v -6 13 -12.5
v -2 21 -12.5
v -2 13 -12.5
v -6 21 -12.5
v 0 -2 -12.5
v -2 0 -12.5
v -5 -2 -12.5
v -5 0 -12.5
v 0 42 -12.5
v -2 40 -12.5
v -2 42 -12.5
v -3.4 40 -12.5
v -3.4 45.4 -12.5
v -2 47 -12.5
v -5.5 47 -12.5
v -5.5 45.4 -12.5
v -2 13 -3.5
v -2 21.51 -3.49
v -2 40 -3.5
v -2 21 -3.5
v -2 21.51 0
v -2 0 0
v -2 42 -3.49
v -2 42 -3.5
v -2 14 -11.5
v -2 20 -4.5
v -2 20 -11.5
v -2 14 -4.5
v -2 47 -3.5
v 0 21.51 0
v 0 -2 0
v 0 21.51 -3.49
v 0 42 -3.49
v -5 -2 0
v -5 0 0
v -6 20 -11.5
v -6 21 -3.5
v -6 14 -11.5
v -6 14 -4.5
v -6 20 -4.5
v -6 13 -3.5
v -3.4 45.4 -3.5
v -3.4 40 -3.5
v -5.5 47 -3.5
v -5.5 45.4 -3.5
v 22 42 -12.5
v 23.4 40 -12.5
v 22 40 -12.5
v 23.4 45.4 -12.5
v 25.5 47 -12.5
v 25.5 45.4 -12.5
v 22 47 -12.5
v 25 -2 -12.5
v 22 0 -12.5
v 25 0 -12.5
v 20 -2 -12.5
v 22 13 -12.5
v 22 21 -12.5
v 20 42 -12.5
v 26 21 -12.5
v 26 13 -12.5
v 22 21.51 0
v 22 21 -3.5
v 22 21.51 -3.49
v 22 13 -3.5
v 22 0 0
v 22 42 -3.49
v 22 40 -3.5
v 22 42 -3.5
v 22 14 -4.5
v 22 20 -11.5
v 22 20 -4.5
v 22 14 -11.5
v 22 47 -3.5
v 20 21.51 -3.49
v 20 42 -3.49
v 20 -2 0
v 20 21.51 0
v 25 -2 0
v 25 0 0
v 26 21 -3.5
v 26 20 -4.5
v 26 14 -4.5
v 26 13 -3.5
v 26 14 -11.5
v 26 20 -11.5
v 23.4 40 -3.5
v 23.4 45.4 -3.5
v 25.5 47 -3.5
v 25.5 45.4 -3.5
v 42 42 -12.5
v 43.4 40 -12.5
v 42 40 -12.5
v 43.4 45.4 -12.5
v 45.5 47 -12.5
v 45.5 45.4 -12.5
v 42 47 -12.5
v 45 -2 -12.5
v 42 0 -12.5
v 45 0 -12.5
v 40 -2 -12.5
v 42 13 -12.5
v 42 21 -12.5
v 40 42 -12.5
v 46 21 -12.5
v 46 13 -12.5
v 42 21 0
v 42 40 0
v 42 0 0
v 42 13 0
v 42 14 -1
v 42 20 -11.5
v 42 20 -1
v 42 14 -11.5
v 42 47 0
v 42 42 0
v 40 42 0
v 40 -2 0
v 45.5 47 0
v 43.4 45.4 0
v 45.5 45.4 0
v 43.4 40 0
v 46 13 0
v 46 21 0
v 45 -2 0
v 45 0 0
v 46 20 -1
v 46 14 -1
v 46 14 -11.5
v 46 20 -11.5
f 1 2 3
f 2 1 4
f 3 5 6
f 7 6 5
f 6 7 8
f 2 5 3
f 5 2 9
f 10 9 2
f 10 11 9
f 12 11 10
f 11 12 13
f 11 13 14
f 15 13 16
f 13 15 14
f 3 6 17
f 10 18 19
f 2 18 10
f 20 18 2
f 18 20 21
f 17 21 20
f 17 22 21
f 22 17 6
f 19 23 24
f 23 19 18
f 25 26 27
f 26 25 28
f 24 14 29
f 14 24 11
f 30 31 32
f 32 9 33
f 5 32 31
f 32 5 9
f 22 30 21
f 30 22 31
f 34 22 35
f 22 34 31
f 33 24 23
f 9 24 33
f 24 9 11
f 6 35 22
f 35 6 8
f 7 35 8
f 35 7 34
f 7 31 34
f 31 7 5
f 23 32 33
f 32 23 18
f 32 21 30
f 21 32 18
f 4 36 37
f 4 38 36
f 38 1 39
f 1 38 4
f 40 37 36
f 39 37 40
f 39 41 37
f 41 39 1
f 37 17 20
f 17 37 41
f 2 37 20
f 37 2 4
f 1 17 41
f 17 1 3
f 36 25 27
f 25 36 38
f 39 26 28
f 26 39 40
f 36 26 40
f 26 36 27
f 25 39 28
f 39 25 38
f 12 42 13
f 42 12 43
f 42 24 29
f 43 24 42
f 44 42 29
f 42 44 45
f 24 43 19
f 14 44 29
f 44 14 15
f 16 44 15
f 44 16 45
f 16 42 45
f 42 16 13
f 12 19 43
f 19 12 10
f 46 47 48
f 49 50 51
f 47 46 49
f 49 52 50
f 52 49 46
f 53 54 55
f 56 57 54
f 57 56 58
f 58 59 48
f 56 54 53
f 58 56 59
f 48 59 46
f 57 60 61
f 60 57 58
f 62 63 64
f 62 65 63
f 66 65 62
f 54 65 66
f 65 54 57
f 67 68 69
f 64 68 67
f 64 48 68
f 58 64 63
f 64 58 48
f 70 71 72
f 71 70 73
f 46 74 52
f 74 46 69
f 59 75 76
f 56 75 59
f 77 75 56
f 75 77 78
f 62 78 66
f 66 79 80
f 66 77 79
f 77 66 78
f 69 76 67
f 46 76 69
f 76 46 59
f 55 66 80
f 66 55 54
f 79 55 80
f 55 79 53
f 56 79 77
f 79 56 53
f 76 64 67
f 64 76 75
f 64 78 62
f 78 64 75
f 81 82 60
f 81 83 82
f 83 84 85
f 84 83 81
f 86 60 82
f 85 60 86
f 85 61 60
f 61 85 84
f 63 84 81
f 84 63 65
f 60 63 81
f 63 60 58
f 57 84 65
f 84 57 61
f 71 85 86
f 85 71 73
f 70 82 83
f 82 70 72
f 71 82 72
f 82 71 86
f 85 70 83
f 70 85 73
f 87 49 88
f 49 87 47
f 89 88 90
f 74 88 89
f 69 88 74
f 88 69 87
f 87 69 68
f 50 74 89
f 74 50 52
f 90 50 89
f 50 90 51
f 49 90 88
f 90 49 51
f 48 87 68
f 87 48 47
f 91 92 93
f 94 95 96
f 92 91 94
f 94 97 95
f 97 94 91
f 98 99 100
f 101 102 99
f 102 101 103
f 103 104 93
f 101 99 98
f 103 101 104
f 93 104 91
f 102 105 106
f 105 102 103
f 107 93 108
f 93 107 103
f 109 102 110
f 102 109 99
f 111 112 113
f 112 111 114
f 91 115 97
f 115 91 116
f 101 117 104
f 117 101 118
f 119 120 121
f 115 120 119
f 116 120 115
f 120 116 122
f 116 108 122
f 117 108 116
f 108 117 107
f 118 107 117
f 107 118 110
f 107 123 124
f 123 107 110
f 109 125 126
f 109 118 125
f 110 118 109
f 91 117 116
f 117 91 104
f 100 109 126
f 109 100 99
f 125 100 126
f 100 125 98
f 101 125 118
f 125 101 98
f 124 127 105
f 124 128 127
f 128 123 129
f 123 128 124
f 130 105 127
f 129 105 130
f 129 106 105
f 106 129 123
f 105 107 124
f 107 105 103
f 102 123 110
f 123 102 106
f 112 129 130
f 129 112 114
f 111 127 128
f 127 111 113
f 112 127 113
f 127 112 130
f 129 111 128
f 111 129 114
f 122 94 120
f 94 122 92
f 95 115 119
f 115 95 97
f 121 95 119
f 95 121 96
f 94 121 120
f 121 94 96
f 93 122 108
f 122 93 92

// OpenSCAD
// file: roundCornersCube.scad
/*
http://codeviewer.org/view/code:1b36 
Copyright (C) 2011 Sergio Vilches
This program is free software: you can redistribute it and/or modify it under the terms of the GNU General Public License as published by the Free Software Foundation, either version 3 of the License, or (at your option) any later version.
This program is distributed in the hope that it will be useful, but WITHOUT ANY WARRANTY; without even the implied warranty of MERCHANTABILITY or FITNESS FOR A PARTICULAR PURPOSE. See the GNU General Public License for more details. You should have received a copy of the GNU General Public License along with this program. If not, see <http://www.gnu.org/licenses/>.
Contact: s.vilches.e@gmail.com


    ----------------------------------------------------------- 
                 Round Corners Cube (Extruded)                
      roundCornersCube(x,y,z,r) Where:                        
         - x = Xdir width                                     
         - y = Ydir width                                     
         - z = Height of the cube                             
         - r = Rounding radious                               
                                                              
      Example: roundCornerCube(10,10,2,1);                    
     *Some times it's needed to use F6 to see good results!   
 	 ----------------------------------------------------------- 
*/
// Test it!
// roundCornersCube(10,5,2,1);


module createMeniscus(h,radius) // This module creates the shape that needs to be substracted from a cube to make its corners rounded.
difference(){        //This shape is basicly the difference between a quarter of cylinder and a cube
   translate([radius/2+0.1,radius/2+0.1,0]){
      cube([radius+0.2,radius+0.1,h+0.2],center=true);         // All that 0.x numbers are to avoid "ghost boundaries" when substracting
   }

   cylinder(h=h+0.2,r=radius,$fn = 25,center=true);
}


module roundCornersCube(x,y,z,r)  // Now we just substract the shape we have created in the four corners
difference(){
   cube([x,y,z], center=true);

translate([x/2-r,y/2-r]){  // We move to the first corner (x,y)
      rotate(0){  
         createMeniscus(z,r); // And substract the meniscus
      }
   }
   translate([-x/2+r,y/2-r]){ // To the second corner (-x,y)
      rotate(90){
         createMeniscus(z,r); // But this time we have to rotate the meniscus 90 deg
      }
   }
      translate([-x/2+r,-y/2+r]){ // ... 
      rotate(180){
         createMeniscus(z,r);
      }
   }
      translate([x/2-r,-y/2+r]){
      rotate(270){
         createMeniscus(z,r);
      }
   }
}

module createSubtractor(h,radius) //Create the shape that needs to be substracted from a cube
difference(){ cube([radius+0.1,radius+0.1,h]); cylinder(h=h,r=radius+0.1,$fn = 25); } //+0.1 stops ghost edges

module rCube(x,y,z,r)//Create a cube and subtract the 4 corners
difference(){
cube([x,y,z]);
translate([x-r,y-r]) rotate(0) createSubtractor(z,r); 
translate([r,y-r]) rotate(90) createSubtractor(z,r);
translate([r,r]) rotate(180) createSubtractor(z,r);
translate([x-r,r]) rotate(270) createSubtractor(z,r);
}
// main file
$fn = 20;

include <roundCornersCube.scad>



/////CASE SIZE/////
//case length (outer)
cl = 175;

//case width (outer)
cw = 95;

//case bottom thickness
cbth = 2;


//case bottom height
cbh = 10+cbth;

//case top thickness
ctth = 2;


//case top height
cth = 15+ctth;

//case roundness radius
crr = 2.5;

//case wall thickness
cwth = 3;

//case key holes width
ckhw = 43;

//case key holes length
ckhl = 110;

//case display hole length
cdhl = 37;

//case display hole width
cdhw = 32;

//case display hole radius
cdhr = 2;


/////KEY SIZES/////
//white key total length
wktl = 42;

//black key total length
bktl = 20;

//white key total width
wktw = 12.5;

//black key total width
bktw = 6;

//distance between keys
dbk = 8;

//white key thickness
wkth = 2;

//white key lip height
wklh = 5;

//key tolerance
key_tol = 1;

module button_holders()
{
holder(r=1.20,h=10-1.6);

translate([91.44,0,0])
holder(r=1.20,h=10-1.6);


translate([91.44,15.875,0])
holder(h=10-1.6);


translate([0,15.875,0])
holder(h=10-1.6);



//translate([44.45,0,0])
translate([46.99,0,0])
holder(r=1.2,h=10-1.6);


//translate([44.45,7.62,0])
translate([46.99,7.62,0])
holder(h=10-1.6);


}


module pcb_holders()
{
holder(h=4, r=0.95);

translate([78.74,-28.575,0])
holder(h=4, r=0.95);

translate([0,-28.575,0])
holder(h=4, r=.95);


translate([78.74,0,0])
holder(h=4, r=.95);


}

module corner_holders()
{
translate([6,6,-cbh+cbth])
holder(h=10);


//translate([6,85-1+5,-cbh+cbth])
//holder(h=10);


translate([170-1,5+1,-cbh+cbth])
holder(h=10);


translate([170-1,85-1+5,-cbh+cbth])
holder(h=10);


}


module 4_button()
{
cylinder(r=6, h=2);
translate([0,0,2])
cylinder(r=4.5, h=4);


}

module 4_buttons()
{
holder();
translate([0,36.195,0])
holder();

translate([26.67,36.195,0])
holder();

translate([26.67,0,0])
holder();
}

module 4_buttons_holes()
{
translate([13.335, 3.175,0])
cylinder(r=5,h=10);

translate([3.175, 13.97,0])
cylinder(r=5,h=10);


translate([13.335, 24.765,0])
cylinder(r=5,h=10);


translate([23.495, 13.97,0])
cylinder(r=5,h=10);
}


module corner_holders_top()
{
translate([6,6,-cbh+cbth])
holder(h=15,w=2);


//translate([6,85-1,-cbh+cbth])
//holder(h=10, w=3);


translate([170-1,5+1,-cbh+cbth])
holder(h=15, w=3);


translate([170-1,85-1+5,-cbh+cbth])
holder(h=15, w=3);


}

module holder(r=1.5, h=5, w=4)
{
difference()
{
cylinder(r=r+w, h=h);
cylinder(r=r, h=h);
}
}

module atmega()
{
color("yellow")
//cube([53, 16, 5]);
cube([85, 35, 1.6]);
}


module AAA_battery()
{
  cylinder(r=10.2/2, h=44.25);
  translate([0,0,44.25])
  cylinder(r=3.3/2, h=1);
}



module small_display()
{
//display outer
do = [58, 32, 1.6];
//display display
dd = [71.2, 25.2, 13.5];

cube(do);

}


module display()
{
//display outer
do = [80, 36, 1.6];
//display display
dd = [71.2, 25.2, 13.5];

cube(do);
translate([4.4,5.4,-3])
color("lightblue")
cube(dd);

module hole()
{
difference()
{
color("red")
cylinder(r=2.5, h=1.61);
cylinder(r=1, h=18);
}
}
//holes
translate([2.5, 2.5,0])
hole();

translate([2.5, do[1]-2.5,0])
hole();

translate([do[0]-2.5, do[1]-2.5,0])
hole();

translate([do[0]-2.5,2.5,0])
hole();
}


module white_key()
{


}


module case_bottom()
{
  

  difference()
  {
  union()
  {
  translate([0,60,0])
  lcd_housing_bottom();

  //holder in lcd housing
  translate([3+48/2,100.5,2])
  holder(h=10);


  //headphone jack holders
  translate([155,6,2])
  holder(r=1.4,h=3);

  translate([155-2.54*10,6,2])
  holder(r=1.4,h=3);

  difference()
  {
  rCube(cl, cw, cbh,crr);
  

  translate([cwth,cwth,ctth])
  cube([cl-cwth*2, cw-cwth*2, cbh]);

  //lcd housing hole
  translate([3,90,2])
  cube([48,6,12]);

  //headphone jack hole
  translate([155-2.54*5,5,10])
  rotate([90,0,0])
  cylinder(d=6, h=10);
  }

  translate([0,0,cbh])
  corner_holders();
  }

  //sunk holes
  translate([6,6,-.01])
  cylinder(r=3.5, h=5);

  translate([170-1,5+1,-.01])
  cylinder(r=3.5, h=5);

  translate([170-1,85-1+5,-.01])
  cylinder(r=3.5, h=5);
  
  //lcd housing sunk hole
  translate([3+48/2,100.5,-.01])
  cylinder(r=3.5, h=5);
  }
}

module key_holder()
{
  translate([0,-2,0])
  difference()
  {
  translate([0,0,-3])
  cube([106,8,8]);

  translate([0,0,3])
  cube([108,5,2]);

  translate([0,3,0])
  cube([108,2,4]);  
  }

  //support
  color("red")
  translate([0,-2,2])
  cube([106,.25,3]);


  color("red")
  translate([0,-.25+1,2])
  cube([106,.25,3]);


}

module holder_at_key(width=wktw)
{
  translate([wktw-width,0,0])
  {
  cube([width,5,1.4]);

  translate([0,3.4,0])
  cube([width,1.6,3.5]);

  }
  
}

module foil_holder(width=wktw)
{
  translate([wktw-width,0,0])
  difference()
  {
  cube([width,8,4]);
  translate([1,1,0])
  cube([width-2,6,6]);
  }
}


module white_key_1(notch=true)
{
  difference()
  {
  union()
  {
  cube([wktw,wktl,wkth]);
  translate([0,-wkth,0])
  cube([wktw,wkth,wklh]);
  }

  //notch for black key
  if(notch)
  translate([-.01,wktl-bktl-key_tol/2+.01,-.1])
  cube([bktw/2+key_tol/2,bktl+key_tol/2,5]);

  }
  
  color("red")
  translate([0,38-23-2,2])
  if(!notch)
    foil_holder();
  else
    foil_holder(width=wktw-bktw/2-key_tol/2);

  translate([0,wktl,2])
  color("brown")
  if(!notch)
    holder_at_key();
  else
    holder_at_key(width=wktw-bktw/2-key_tol/2);

  if(notch)
    translate([bktw/2+key_tol/2,wktl-2,2])
    cube([wktw-bktw/2-key_tol/2,2,1.4]);
  else
    translate([0,wktl-2,2])
    cube([wktw,2,1.4]);
}

rotate([0,-90,0])
white_key_2();

translate([20,0,0])
rotate([0,90,0])
white_key_1();


translate([40,0,0])
rotate([0,90,0])
white_key_3();


module white_key_2()
{
mirror([1,0,0])
white_key_1();

}

module white_key_3()
{
white_key_1(false);
}

module case_top()
{

  //LCD spacers
  translate([cwth*2+40-2,46+10,10])
  holder(h=5, w=2, r=.95);

  translate([cwth*2,46+10,10])
  holder(h=5, w=2, r=.95);

  translate([cwth*2,46+40+10,10])
  holder(h=5, w=2, r=.95);

  translate([cwth*2+40,46+40+10,10])
  holder(h=5, w=2, r=.95);


  //spacers for 4 buttons
  translate([90,55+2,10])
  rotate([0,0,90])
  4_buttons();


  //holders for keys
  translate([cwth*2+4,45,10])
  key_holder();


  difference()
  {
    rCube(cl, cw, cth, crr);
    translate([cwth*3,-.1,-1])
    {
      rCube(ckhl, ckhw, cth*2, 4);
      translate([0,-4,0])
      cube([ckhl, ckhw, cth*2]);
    }

    translate([cwth,cwth,-.01])
    cube([cl-cwth*2, cw-cwth*2, cth-ctth]);

    //display hole
    translate([cwth*3-2,52+10-2,0])
    rCube(cdhl, cdhw, 22, cdhr);

    //speaker hole
    translate([cl-25-cwth,cwth*1+25,8])
    color("red")
    //cylinder(r=25, h=10);
    speaker_hole();


    //pot hole
    translate([160, 68, 10])
    cylinder(r=4, h=10);


    //ISP programmer hole
    translate([140-25, 68-5, 10])
    rCube(30,20,10,8);



    //lcd inset
    translate([3,76,0])
    cube([48,20,15]);


    //4 buttons holes
  translate([90-8.255,55+2,10])
  rotate([0,0,90])
  4_buttons_holes();


  }


  

}

module batteries()
{
translate([50,90,-6])
{
rotate([-90,0,90])
//translate([190,0,0])
{
AAA_battery();

translate([0,0,-46])
AAA_battery();


translate([0,0,-46*2])
AAA_battery();


translate([0,0,-46*3])
AAA_battery();


}
}
}

module speaker_hole(d=50)
{
//cylinder(d=d, h=5);

rotate([0,0,-45])
translate([-3-15,-15,-1])
{
rCube(6,30,10,3);

translate([15,0,0])
rCube(6,30,10,3);

translate([15*2,0,0])
rCube(6,30,10,3);

}

}



module lcd_housing()
{
  difference()
  {
    rCube(48+cwth*2,40+cwth*2,cth,8);
    translate([cwth, cwth, -cbth])
    rCube(48, 40,cth, 8);
  translate([0,-2,-2])
  cube([55,34,40]);

  }
}


module lcd_housing_bottom()
{
  difference()
  {
    rCube(48+cwth*2,40+cwth*2,cbh,8);
    translate([cwth, cwth, cbth])
    rCube(48, 40,cbh, 8);
  translate([0,-2,-2])
  cube([55,34,40]);

  }
}


module battery_holder(width=56)
{
cube([3,52,5]);
translate([width+3,0,0])

translate([0,52-20,0])
cube([3,20,14+4]);

translate([width+3,52-20,16])
rotate([-90,0,0])
cylinder(r=2,h=20, $fn=4);

difference()
{
translate([width+3+3,52-20,0])
rotate([-90,0,0])
cylinder(r=3,h=20, $fn=4);

translate([width,52-21,-5])
cube([20,25,5]);
}


}


//lcd_housing();

//speaker_hole();

//translate([cwth*2,50,-2.4+2])
//display();

//translate([0,0,20])
//small_display();
//case_top();

//translate([96,55,10])
//atmega();

//batteries();
/*
translate([20,85,0])
rotate([90,0,0])
AAA_battery();

translate([32,85,0])
rotate([90,0,0])
AAA_battery();


translate([44,85,0])
rotate([90,0,0])
AAA_battery();


translate([56,85,0])
rotate([90,0,0])
AAA_battery();
*/

/*
translate([20,35,-10])
battery_holder();

difference()
{
union()
{
translate([0,0,-cbh])
case_bottom();

translate([18,16,-cbh+cbth])
button_holders();


translate([88,76,-cbh+cbth])
pcb_holders();

//corner_holders();
}


//translate([80,-2,-30])
//cube([.5,200,200]);

}
*/
/*
rotate([0,180,0])
difference()
{
union()
{
translate([0,60,0])
lcd_housing();
translate([0,0,10])
corner_holders_top();
case_top();
}

//translate([80+10,-2,-30])
//cube([.5,100,100]);


}

//4_button();

//speaker
//translate([140,0,0])
//cylinder(d=50, h=25);
*/
